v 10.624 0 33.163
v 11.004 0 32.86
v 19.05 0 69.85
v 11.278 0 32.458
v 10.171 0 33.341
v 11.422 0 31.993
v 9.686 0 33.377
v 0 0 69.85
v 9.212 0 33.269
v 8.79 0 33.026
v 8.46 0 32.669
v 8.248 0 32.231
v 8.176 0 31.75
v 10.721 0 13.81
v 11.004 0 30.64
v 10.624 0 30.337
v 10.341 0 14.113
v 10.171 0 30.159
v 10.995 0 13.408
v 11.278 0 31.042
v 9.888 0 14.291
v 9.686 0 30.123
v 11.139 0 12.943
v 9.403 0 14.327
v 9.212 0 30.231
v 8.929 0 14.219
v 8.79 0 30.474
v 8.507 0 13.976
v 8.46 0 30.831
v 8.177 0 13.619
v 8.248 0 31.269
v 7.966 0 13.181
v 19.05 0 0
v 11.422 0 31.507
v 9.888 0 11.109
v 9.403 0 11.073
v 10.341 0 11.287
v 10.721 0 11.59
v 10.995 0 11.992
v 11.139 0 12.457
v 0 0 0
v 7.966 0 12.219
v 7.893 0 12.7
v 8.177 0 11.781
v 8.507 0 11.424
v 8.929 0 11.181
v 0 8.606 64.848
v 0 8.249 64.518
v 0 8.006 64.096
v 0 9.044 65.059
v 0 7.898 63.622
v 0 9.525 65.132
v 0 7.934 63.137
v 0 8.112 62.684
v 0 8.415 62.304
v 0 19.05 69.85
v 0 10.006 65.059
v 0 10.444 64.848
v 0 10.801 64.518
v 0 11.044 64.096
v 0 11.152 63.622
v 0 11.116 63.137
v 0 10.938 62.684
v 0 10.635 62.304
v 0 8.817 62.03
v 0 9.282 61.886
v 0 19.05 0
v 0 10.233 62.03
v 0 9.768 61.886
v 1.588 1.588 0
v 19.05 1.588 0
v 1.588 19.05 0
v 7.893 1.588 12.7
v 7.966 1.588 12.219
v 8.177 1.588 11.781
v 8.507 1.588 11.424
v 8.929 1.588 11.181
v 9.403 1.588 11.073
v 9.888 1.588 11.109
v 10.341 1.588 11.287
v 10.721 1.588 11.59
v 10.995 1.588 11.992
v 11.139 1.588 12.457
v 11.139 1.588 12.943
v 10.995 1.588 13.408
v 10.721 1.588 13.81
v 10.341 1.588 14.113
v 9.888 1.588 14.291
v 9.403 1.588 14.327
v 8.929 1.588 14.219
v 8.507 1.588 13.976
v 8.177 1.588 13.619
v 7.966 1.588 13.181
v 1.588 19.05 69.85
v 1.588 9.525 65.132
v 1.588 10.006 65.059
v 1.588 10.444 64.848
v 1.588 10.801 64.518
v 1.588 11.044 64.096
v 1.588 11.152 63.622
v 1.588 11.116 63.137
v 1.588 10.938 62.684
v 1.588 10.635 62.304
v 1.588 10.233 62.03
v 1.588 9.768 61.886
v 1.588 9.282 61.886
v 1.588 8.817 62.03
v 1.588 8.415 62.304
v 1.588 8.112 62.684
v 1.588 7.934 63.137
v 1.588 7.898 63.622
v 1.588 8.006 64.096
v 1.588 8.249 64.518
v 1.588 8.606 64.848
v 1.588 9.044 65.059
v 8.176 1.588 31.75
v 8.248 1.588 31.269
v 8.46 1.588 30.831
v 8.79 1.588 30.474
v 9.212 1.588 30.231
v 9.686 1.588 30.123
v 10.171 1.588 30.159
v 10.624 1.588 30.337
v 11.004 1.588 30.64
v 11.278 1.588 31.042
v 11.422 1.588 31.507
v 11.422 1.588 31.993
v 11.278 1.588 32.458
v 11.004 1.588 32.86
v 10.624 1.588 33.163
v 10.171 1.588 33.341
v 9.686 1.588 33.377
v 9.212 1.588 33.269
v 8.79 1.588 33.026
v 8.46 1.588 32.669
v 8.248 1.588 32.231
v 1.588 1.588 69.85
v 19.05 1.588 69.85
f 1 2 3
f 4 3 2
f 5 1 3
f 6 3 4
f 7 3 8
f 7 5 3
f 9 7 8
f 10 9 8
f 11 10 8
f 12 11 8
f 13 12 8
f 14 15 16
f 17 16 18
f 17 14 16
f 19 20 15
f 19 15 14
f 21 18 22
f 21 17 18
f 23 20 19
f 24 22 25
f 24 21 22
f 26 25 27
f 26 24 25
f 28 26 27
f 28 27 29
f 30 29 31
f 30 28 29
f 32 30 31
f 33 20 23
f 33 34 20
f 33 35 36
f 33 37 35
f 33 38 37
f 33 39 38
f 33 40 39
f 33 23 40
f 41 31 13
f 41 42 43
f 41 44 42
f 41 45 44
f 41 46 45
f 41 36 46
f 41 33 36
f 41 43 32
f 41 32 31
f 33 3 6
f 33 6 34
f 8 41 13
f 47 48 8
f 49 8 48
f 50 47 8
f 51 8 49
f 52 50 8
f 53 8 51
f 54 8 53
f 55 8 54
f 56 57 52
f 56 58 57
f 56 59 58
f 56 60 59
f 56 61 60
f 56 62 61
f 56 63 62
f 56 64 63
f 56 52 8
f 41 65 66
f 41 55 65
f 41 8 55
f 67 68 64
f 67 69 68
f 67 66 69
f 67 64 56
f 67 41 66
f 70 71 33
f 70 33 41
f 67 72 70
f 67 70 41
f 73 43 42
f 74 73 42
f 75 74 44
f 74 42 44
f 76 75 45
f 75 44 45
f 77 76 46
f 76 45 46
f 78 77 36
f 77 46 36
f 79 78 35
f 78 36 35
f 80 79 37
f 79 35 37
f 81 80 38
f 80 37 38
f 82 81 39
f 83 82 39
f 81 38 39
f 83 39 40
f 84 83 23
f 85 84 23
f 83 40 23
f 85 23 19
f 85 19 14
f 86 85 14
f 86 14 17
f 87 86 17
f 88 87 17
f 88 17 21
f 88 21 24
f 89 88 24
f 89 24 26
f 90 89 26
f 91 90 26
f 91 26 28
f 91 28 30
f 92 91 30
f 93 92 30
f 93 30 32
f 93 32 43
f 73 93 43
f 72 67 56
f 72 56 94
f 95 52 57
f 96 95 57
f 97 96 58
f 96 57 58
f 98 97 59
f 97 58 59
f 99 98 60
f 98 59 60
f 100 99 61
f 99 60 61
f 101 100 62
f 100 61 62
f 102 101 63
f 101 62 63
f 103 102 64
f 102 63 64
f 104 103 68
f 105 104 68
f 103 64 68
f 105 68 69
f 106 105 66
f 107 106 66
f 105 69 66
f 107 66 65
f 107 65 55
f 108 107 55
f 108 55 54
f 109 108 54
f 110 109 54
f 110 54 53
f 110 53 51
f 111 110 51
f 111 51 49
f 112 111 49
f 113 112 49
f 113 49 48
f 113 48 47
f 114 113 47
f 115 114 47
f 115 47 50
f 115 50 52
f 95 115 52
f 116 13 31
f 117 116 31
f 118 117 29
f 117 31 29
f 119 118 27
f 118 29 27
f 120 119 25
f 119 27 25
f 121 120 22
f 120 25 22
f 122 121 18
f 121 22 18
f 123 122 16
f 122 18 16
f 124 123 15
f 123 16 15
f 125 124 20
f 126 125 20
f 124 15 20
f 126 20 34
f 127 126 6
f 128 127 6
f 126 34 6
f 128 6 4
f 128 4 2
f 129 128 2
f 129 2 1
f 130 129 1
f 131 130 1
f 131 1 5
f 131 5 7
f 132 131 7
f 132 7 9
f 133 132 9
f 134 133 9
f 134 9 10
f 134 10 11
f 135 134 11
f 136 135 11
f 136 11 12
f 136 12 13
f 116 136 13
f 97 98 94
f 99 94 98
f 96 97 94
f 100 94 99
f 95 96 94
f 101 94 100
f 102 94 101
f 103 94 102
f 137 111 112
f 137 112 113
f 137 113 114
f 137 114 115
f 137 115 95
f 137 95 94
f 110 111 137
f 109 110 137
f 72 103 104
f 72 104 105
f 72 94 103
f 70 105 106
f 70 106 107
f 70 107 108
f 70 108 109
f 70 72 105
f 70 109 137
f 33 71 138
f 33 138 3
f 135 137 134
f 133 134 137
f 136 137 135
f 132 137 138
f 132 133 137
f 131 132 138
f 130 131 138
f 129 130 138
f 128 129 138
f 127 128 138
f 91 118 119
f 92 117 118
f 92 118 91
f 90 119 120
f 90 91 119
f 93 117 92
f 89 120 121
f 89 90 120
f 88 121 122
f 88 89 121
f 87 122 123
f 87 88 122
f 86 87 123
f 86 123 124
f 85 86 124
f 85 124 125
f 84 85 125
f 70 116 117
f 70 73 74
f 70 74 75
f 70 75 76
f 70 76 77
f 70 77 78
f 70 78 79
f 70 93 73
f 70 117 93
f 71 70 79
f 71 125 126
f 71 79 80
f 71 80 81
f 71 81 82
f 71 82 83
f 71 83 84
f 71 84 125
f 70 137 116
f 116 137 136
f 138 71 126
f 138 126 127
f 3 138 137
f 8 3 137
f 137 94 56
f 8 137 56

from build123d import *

# Parameters (mm, degrees)
BOSS_EXTRUDE1_DEPTH   = 69.85
F_4_CLEARANCE_HOLE1_D = 3.2639
F_4_CLEARANCE_HOLE2_D = 3.2639


with BuildPart() as part:
    # Sketch1 → Boss-Extrude1 (new body)
    with BuildSketch(Plane.XY):
        Polygon((0, 0), (0, 19.05), (1.5875, 19.05), (1.5875, 1.5875), (19.05, 1.5875), (19.05, 0), align=None)
    extrude(amount=BOSS_EXTRUDE1_DEPTH)

    # #4 Clearance Hole1 (through all)
    with Locations(Plane(origin=(1.5875, 0, 0), x_dir=(0, 0, -1), z_dir=(1, 0, 0))):
        with Locations((-63.5, 9.525)):
            Hole(F_4_CLEARANCE_HOLE1_D / 2)

    # #4 Clearance Hole2 (through all)
    with Locations(Plane(origin=(0, 1.5875, 0), x_dir=(1, 0, 0), z_dir=(0, 1, 0))):
        with Locations((9.525, -12.7), (9.807915651, -31.75)):
            Hole(F_4_CLEARANCE_HOLE2_D / 2)


solid = part.part
